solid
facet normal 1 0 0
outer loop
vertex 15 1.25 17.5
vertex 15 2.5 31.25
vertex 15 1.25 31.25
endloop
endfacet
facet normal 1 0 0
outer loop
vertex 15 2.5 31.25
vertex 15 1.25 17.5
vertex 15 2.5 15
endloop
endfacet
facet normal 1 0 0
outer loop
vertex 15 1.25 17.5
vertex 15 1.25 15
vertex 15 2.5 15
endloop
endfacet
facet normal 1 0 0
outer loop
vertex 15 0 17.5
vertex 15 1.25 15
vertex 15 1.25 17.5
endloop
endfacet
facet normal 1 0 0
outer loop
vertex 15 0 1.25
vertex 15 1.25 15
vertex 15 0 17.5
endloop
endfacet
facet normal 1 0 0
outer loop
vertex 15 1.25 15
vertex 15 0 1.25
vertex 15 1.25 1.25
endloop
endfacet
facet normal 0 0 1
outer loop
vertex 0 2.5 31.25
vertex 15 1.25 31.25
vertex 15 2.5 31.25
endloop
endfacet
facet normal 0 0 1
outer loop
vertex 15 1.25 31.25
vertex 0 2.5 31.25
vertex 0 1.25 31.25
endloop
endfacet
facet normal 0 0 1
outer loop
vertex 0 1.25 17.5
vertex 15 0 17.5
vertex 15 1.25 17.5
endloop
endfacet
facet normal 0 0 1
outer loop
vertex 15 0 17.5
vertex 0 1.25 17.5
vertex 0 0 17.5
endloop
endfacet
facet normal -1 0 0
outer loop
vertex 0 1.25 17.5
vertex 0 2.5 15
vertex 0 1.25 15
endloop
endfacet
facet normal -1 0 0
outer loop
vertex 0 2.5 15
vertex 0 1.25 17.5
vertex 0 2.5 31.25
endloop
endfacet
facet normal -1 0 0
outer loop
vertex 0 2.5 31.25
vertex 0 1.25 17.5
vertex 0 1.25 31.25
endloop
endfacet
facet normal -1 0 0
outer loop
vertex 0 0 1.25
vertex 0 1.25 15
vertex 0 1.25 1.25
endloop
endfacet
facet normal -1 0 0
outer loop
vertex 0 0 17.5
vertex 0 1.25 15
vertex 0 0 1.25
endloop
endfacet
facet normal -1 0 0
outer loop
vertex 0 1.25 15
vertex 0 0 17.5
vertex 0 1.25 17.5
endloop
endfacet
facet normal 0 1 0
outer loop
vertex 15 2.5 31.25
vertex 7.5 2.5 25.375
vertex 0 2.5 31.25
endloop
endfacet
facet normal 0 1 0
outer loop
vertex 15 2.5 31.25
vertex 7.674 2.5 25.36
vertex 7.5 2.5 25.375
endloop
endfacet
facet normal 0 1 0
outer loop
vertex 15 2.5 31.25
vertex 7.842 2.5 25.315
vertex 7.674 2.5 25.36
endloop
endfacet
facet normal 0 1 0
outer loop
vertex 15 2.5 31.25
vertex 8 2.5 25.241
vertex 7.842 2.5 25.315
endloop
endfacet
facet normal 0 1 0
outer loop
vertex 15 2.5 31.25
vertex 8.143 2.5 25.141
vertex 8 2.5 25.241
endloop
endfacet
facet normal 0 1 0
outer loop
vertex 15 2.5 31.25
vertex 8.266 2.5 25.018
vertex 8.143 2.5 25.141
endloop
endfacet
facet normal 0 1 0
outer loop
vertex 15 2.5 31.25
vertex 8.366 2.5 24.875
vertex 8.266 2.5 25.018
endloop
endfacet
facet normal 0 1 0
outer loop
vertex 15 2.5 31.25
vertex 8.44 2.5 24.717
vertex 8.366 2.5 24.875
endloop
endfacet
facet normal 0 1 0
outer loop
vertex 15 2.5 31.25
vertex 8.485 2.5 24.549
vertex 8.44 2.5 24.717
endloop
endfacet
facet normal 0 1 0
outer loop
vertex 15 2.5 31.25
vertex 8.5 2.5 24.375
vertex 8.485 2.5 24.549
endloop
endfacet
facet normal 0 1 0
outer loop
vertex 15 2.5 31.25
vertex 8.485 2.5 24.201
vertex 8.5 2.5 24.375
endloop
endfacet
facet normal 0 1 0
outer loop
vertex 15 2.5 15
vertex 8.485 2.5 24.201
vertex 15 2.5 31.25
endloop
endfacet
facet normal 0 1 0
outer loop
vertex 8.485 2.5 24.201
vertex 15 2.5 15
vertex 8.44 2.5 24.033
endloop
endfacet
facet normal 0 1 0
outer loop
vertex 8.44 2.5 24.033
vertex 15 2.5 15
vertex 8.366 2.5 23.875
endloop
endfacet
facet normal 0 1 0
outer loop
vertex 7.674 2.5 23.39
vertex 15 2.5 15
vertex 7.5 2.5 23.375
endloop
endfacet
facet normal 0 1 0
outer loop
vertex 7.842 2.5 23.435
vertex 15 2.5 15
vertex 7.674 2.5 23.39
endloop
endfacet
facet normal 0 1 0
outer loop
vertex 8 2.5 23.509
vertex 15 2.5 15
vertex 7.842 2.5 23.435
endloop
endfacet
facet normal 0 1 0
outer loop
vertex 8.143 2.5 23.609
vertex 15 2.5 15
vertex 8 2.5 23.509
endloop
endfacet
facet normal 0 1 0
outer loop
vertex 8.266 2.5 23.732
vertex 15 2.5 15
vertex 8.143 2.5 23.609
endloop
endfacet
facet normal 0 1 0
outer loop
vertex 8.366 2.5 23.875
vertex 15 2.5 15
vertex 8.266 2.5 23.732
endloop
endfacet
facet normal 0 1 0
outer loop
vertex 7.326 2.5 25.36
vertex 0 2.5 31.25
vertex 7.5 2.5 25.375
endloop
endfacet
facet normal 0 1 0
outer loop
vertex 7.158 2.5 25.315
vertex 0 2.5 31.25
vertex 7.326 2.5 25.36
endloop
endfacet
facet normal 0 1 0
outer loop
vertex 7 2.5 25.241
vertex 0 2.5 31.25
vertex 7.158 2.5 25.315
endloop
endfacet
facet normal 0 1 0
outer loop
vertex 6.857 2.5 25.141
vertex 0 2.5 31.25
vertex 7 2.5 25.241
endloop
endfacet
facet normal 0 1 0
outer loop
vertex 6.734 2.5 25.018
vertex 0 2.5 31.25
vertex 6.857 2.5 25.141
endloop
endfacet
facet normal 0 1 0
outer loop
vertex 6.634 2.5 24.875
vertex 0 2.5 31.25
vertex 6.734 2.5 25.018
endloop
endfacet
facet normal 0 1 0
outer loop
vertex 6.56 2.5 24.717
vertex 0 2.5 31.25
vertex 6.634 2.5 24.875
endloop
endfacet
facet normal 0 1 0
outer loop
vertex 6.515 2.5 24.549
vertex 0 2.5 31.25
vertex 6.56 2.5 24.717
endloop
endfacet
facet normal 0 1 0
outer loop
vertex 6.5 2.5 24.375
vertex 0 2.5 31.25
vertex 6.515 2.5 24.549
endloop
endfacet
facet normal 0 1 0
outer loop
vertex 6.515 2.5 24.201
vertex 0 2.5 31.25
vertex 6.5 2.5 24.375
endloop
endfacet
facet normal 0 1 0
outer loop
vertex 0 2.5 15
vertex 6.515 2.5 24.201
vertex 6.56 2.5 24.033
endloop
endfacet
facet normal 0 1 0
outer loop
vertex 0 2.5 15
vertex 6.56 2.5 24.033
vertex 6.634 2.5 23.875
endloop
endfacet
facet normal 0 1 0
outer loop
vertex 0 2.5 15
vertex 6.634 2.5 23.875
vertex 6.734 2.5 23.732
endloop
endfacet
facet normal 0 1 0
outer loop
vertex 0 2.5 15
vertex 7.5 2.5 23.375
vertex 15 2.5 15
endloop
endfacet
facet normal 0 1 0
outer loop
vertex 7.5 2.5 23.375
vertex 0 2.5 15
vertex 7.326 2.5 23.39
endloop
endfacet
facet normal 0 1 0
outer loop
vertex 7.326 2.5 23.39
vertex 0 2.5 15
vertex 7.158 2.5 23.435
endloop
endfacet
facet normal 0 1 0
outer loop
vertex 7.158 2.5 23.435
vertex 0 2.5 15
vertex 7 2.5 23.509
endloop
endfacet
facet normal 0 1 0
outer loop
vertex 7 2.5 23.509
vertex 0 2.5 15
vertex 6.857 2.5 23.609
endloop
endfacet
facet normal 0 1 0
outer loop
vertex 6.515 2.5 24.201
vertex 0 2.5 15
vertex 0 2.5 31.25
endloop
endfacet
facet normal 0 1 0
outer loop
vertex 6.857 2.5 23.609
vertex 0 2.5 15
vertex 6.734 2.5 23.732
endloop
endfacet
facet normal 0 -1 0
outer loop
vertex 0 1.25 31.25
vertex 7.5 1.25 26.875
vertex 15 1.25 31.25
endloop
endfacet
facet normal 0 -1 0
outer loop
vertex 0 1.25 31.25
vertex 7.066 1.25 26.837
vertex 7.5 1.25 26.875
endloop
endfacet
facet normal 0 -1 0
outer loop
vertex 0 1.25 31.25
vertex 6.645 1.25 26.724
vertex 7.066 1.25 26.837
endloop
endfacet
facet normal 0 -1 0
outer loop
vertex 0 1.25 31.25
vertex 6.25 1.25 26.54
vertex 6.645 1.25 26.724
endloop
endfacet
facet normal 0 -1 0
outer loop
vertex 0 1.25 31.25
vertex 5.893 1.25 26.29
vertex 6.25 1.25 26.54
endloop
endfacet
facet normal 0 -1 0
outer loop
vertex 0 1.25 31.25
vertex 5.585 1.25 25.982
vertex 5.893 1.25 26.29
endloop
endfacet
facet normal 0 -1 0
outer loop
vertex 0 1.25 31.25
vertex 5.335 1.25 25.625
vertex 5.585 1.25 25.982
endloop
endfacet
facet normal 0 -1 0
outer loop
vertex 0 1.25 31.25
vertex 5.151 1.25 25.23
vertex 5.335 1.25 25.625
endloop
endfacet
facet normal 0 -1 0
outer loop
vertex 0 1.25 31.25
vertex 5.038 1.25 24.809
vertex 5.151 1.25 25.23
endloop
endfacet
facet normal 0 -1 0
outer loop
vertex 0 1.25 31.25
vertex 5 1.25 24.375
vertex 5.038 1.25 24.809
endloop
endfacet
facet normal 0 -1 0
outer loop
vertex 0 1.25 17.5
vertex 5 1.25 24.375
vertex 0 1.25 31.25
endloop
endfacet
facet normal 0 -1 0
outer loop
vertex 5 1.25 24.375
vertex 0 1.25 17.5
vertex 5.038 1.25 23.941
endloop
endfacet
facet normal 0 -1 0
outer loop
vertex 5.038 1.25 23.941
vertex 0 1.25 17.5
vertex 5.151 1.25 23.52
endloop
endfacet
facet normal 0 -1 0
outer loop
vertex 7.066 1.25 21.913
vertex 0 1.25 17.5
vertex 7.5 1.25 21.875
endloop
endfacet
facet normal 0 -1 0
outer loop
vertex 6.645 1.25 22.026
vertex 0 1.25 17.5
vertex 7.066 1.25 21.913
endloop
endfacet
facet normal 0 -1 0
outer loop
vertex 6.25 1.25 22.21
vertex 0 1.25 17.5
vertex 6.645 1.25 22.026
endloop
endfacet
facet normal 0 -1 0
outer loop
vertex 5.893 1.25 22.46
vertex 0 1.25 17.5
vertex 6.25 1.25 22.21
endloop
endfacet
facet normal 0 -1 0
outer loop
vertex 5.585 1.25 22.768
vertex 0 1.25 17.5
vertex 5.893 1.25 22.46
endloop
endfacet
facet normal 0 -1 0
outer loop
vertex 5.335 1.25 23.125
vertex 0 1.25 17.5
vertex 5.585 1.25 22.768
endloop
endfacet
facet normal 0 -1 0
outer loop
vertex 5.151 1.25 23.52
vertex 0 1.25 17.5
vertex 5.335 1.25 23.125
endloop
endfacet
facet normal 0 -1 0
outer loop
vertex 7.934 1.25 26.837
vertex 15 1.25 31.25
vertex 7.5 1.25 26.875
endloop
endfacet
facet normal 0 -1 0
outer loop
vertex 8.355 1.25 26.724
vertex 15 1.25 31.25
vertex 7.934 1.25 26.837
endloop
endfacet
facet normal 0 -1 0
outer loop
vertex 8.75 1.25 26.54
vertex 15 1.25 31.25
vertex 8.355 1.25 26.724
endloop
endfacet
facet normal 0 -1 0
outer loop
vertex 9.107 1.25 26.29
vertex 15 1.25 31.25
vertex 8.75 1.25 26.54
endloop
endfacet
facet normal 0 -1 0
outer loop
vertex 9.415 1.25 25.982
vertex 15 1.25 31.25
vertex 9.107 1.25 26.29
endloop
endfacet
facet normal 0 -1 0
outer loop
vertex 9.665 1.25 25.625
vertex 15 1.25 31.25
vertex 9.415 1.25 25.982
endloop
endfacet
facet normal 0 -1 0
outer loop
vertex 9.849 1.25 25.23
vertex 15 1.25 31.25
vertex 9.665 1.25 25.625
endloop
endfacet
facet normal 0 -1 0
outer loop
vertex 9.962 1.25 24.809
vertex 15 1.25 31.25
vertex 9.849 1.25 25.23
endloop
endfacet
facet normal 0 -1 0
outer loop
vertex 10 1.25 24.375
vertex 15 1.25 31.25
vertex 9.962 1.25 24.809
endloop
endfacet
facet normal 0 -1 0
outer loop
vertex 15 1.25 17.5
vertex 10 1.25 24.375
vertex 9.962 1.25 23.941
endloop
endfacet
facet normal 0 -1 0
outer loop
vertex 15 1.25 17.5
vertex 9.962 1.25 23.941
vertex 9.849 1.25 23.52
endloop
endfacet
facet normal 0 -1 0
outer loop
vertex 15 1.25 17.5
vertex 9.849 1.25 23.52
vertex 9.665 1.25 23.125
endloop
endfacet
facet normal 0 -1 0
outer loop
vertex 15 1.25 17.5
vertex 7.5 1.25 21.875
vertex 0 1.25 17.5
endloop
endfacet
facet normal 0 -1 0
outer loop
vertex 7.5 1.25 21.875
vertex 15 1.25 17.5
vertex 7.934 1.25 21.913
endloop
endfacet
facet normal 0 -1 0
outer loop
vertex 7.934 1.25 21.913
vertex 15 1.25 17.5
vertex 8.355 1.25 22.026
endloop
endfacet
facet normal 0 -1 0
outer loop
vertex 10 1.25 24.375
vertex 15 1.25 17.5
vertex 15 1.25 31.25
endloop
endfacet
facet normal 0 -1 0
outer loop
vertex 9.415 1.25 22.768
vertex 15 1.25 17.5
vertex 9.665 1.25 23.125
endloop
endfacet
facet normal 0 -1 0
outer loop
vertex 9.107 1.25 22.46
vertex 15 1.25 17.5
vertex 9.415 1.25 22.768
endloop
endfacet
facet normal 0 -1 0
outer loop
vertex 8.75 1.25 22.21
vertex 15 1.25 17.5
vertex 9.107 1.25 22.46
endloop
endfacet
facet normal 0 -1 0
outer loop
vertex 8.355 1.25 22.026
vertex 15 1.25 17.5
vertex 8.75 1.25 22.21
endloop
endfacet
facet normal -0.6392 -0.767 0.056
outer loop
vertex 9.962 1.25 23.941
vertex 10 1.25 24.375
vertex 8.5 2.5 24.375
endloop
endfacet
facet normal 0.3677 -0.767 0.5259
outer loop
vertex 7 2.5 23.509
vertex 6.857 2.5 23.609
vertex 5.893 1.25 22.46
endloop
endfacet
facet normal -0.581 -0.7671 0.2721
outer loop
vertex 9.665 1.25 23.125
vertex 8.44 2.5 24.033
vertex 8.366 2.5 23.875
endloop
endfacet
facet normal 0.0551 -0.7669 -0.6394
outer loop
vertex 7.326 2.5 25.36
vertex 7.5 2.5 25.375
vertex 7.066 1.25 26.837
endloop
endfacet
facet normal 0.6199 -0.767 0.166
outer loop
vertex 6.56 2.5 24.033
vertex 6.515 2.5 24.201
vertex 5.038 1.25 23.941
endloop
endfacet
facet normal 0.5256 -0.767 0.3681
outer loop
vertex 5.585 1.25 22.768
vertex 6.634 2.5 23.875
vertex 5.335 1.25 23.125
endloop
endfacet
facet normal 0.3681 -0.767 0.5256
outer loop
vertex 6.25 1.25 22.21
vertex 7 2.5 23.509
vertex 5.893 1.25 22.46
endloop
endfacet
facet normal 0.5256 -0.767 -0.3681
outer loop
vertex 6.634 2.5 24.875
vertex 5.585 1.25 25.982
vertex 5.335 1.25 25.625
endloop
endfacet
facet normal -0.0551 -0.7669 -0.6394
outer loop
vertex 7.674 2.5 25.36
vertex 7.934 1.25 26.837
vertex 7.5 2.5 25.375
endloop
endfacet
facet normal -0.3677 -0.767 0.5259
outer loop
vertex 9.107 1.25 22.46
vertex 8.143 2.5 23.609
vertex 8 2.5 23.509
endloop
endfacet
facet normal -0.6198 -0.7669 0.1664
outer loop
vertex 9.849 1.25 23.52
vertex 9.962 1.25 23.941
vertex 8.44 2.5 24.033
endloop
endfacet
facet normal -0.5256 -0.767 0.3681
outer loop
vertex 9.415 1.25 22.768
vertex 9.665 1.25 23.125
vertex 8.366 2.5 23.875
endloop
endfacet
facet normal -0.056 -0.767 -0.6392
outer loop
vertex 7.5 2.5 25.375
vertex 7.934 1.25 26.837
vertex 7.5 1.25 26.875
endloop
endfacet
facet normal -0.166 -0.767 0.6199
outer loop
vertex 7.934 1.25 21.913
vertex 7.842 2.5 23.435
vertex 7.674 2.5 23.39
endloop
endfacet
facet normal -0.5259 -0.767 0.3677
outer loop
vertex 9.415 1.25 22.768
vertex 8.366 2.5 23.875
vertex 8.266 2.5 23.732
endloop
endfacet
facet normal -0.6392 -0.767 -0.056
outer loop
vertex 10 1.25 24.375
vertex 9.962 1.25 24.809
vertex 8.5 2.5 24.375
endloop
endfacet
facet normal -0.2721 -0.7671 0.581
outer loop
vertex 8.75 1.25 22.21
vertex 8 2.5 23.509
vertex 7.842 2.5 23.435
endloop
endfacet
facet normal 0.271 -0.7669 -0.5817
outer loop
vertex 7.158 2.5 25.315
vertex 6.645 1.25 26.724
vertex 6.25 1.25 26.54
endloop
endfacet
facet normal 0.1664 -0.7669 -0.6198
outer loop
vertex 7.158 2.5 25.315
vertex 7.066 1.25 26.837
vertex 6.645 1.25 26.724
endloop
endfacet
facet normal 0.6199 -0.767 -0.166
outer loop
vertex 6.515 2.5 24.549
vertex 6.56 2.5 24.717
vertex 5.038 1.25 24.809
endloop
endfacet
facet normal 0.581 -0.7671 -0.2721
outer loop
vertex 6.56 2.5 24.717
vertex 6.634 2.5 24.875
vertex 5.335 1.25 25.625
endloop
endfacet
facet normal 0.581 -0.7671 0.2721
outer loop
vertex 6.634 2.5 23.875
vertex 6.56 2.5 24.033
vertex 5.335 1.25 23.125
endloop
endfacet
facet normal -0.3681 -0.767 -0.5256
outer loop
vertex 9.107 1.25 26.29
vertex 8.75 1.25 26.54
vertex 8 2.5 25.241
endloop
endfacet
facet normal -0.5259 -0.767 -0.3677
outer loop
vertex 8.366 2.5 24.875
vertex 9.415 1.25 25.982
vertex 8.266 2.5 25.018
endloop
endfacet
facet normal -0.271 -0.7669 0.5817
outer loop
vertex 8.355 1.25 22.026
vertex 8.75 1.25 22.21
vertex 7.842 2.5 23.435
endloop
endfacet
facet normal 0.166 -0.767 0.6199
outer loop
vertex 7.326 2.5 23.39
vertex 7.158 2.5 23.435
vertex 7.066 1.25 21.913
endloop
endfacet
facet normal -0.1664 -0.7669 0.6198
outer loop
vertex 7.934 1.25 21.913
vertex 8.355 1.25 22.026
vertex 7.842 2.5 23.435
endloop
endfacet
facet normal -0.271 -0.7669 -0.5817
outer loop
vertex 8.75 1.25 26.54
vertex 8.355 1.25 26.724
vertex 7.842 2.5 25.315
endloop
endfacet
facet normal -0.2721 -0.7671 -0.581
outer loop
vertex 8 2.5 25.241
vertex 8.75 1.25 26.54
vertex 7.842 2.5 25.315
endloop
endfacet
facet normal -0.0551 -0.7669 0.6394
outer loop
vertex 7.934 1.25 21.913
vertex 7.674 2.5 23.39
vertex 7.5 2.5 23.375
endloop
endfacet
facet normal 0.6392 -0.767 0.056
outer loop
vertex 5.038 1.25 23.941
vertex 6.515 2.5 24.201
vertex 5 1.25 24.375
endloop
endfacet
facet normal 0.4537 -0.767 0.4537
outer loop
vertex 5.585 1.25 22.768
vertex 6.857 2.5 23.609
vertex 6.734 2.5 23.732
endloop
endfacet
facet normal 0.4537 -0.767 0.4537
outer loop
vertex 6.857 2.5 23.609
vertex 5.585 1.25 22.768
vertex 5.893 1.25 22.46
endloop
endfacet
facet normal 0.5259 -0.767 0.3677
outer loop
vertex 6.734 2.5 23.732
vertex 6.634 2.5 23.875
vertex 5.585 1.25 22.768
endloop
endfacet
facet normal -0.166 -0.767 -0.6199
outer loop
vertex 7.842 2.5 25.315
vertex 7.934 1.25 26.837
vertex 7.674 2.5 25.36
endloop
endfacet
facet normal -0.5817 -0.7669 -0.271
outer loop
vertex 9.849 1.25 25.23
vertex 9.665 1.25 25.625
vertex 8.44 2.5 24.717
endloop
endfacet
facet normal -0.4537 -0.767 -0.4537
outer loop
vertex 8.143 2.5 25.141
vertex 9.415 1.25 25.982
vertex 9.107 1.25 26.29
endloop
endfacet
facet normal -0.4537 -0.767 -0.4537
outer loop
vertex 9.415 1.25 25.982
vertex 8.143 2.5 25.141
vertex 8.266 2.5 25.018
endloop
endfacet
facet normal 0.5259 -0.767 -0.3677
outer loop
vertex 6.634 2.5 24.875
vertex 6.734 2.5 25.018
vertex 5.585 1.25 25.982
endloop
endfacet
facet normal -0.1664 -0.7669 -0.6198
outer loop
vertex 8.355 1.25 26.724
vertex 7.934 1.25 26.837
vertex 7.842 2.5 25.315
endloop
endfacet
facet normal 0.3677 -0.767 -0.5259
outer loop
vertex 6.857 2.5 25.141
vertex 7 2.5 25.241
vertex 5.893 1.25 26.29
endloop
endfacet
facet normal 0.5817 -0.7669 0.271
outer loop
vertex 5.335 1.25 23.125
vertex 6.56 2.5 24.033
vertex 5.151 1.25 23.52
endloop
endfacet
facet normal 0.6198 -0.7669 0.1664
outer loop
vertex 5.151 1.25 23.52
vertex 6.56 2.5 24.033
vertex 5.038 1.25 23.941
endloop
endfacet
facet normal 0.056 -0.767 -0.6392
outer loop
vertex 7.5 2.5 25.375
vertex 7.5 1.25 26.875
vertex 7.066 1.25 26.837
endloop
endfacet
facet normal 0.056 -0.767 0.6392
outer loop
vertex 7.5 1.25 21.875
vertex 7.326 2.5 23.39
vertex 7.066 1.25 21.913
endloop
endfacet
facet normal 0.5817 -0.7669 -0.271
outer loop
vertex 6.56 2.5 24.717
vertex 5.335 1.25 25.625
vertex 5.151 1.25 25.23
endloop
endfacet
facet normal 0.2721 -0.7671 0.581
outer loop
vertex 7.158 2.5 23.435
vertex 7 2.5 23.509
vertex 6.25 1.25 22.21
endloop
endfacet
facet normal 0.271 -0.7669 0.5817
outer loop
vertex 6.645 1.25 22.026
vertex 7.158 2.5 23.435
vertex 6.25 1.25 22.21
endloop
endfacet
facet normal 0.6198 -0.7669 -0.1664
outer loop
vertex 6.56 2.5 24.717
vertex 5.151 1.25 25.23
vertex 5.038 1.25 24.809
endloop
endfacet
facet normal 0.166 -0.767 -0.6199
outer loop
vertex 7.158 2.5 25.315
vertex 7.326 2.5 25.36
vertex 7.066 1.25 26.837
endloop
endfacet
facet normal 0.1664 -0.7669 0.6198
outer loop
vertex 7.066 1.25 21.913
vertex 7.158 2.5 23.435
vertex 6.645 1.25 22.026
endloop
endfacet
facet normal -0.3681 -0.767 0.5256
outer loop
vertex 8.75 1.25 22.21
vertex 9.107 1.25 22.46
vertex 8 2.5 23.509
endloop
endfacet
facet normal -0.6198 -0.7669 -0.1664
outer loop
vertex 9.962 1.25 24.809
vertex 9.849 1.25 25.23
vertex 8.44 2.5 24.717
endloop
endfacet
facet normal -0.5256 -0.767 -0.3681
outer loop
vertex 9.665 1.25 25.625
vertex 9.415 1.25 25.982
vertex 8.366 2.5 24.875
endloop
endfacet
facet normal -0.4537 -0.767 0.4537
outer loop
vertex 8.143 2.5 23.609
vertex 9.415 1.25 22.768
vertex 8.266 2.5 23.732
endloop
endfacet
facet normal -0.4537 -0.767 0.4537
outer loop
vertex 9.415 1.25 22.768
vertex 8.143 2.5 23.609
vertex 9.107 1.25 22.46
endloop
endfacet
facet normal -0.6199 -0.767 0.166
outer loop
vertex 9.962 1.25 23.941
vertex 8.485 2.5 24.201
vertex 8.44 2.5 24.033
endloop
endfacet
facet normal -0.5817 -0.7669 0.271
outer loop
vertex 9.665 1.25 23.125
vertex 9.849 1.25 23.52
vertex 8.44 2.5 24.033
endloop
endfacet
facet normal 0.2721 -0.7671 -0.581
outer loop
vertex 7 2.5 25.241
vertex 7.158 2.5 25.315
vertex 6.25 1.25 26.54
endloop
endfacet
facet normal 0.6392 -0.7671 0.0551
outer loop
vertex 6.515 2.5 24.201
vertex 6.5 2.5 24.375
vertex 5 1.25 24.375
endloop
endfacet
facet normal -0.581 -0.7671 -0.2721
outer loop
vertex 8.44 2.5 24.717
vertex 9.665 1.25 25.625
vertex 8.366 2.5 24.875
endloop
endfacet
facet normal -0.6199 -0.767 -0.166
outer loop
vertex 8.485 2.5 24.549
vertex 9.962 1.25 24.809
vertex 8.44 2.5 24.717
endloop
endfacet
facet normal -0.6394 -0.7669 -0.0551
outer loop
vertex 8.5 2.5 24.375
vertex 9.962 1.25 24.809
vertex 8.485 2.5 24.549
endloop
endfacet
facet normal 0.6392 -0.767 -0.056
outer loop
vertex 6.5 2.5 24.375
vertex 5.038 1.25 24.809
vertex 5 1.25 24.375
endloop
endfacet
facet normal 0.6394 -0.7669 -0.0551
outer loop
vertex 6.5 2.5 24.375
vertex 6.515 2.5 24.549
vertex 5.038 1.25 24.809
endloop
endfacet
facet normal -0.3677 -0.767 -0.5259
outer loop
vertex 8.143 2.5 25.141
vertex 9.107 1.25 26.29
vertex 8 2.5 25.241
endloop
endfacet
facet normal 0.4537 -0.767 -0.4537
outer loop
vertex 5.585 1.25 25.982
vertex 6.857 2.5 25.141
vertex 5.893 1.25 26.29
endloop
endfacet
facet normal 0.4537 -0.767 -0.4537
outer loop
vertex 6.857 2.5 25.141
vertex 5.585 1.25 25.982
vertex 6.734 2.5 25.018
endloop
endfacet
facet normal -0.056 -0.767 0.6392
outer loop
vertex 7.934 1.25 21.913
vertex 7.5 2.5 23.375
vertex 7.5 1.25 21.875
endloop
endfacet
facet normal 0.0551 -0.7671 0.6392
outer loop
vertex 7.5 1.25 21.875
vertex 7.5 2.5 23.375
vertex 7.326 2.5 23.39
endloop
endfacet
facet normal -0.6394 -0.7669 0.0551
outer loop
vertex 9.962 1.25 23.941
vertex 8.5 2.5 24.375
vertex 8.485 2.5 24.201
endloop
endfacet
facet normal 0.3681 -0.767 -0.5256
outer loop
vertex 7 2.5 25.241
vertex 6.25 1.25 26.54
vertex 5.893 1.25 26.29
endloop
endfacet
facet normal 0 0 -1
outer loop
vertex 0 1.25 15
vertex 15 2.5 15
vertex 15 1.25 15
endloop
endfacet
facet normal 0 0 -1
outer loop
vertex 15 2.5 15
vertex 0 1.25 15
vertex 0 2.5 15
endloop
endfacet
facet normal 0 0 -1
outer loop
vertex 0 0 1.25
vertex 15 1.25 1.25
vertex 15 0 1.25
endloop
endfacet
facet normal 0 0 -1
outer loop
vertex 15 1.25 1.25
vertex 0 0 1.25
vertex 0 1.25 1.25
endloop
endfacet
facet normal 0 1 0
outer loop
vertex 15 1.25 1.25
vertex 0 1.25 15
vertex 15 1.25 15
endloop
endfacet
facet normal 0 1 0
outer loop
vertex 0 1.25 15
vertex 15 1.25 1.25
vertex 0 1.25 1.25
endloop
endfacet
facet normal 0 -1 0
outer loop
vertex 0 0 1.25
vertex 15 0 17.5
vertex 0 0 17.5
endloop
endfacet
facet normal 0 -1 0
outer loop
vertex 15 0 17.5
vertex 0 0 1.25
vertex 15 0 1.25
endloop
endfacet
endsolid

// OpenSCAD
//Breite
b=15;
//Dicke
d=1.25; //-1.35
//Innen
bi=b-d;
//Schraube oben durchmesser
sod=5;
//Schraube unten durchmesser
sud=2;
//Schraubenkopflänge
skl=d;
//Klickabstand
ka=11;
//Breite-Klickabstand
kb=b-ka;
//thickness
t=d;

$fn=36;

//Front A: volle Hoehe innen, damit auch gut gegen den Boden gedrückt wird
module fronta() {
    translate([0,0,d])
    cube([b,t,bi]);
}

fronta();

module connector()
{
translate([0,0,b])
cube([b,t+t,t+t]);
}

connector();

difference()
{
translate([0,t,bi+t+t])
fronta();

color("green")
translate([b/2,d,bi+bi/2+t+t+t])
rotate([270,0,0])
cylinder(d, d1=sod,d2=sud);

}
/*
module klick()
{
cube([b,skl,bi-ka]);
}

translate([0,0,d+ka])
klick();

color("green")
translate([0,skl,b])
klick();

color("orange")
translate([0,0,b])
klick();

translate([0,skl,b+kb])
color("gray")
klick();
*/
